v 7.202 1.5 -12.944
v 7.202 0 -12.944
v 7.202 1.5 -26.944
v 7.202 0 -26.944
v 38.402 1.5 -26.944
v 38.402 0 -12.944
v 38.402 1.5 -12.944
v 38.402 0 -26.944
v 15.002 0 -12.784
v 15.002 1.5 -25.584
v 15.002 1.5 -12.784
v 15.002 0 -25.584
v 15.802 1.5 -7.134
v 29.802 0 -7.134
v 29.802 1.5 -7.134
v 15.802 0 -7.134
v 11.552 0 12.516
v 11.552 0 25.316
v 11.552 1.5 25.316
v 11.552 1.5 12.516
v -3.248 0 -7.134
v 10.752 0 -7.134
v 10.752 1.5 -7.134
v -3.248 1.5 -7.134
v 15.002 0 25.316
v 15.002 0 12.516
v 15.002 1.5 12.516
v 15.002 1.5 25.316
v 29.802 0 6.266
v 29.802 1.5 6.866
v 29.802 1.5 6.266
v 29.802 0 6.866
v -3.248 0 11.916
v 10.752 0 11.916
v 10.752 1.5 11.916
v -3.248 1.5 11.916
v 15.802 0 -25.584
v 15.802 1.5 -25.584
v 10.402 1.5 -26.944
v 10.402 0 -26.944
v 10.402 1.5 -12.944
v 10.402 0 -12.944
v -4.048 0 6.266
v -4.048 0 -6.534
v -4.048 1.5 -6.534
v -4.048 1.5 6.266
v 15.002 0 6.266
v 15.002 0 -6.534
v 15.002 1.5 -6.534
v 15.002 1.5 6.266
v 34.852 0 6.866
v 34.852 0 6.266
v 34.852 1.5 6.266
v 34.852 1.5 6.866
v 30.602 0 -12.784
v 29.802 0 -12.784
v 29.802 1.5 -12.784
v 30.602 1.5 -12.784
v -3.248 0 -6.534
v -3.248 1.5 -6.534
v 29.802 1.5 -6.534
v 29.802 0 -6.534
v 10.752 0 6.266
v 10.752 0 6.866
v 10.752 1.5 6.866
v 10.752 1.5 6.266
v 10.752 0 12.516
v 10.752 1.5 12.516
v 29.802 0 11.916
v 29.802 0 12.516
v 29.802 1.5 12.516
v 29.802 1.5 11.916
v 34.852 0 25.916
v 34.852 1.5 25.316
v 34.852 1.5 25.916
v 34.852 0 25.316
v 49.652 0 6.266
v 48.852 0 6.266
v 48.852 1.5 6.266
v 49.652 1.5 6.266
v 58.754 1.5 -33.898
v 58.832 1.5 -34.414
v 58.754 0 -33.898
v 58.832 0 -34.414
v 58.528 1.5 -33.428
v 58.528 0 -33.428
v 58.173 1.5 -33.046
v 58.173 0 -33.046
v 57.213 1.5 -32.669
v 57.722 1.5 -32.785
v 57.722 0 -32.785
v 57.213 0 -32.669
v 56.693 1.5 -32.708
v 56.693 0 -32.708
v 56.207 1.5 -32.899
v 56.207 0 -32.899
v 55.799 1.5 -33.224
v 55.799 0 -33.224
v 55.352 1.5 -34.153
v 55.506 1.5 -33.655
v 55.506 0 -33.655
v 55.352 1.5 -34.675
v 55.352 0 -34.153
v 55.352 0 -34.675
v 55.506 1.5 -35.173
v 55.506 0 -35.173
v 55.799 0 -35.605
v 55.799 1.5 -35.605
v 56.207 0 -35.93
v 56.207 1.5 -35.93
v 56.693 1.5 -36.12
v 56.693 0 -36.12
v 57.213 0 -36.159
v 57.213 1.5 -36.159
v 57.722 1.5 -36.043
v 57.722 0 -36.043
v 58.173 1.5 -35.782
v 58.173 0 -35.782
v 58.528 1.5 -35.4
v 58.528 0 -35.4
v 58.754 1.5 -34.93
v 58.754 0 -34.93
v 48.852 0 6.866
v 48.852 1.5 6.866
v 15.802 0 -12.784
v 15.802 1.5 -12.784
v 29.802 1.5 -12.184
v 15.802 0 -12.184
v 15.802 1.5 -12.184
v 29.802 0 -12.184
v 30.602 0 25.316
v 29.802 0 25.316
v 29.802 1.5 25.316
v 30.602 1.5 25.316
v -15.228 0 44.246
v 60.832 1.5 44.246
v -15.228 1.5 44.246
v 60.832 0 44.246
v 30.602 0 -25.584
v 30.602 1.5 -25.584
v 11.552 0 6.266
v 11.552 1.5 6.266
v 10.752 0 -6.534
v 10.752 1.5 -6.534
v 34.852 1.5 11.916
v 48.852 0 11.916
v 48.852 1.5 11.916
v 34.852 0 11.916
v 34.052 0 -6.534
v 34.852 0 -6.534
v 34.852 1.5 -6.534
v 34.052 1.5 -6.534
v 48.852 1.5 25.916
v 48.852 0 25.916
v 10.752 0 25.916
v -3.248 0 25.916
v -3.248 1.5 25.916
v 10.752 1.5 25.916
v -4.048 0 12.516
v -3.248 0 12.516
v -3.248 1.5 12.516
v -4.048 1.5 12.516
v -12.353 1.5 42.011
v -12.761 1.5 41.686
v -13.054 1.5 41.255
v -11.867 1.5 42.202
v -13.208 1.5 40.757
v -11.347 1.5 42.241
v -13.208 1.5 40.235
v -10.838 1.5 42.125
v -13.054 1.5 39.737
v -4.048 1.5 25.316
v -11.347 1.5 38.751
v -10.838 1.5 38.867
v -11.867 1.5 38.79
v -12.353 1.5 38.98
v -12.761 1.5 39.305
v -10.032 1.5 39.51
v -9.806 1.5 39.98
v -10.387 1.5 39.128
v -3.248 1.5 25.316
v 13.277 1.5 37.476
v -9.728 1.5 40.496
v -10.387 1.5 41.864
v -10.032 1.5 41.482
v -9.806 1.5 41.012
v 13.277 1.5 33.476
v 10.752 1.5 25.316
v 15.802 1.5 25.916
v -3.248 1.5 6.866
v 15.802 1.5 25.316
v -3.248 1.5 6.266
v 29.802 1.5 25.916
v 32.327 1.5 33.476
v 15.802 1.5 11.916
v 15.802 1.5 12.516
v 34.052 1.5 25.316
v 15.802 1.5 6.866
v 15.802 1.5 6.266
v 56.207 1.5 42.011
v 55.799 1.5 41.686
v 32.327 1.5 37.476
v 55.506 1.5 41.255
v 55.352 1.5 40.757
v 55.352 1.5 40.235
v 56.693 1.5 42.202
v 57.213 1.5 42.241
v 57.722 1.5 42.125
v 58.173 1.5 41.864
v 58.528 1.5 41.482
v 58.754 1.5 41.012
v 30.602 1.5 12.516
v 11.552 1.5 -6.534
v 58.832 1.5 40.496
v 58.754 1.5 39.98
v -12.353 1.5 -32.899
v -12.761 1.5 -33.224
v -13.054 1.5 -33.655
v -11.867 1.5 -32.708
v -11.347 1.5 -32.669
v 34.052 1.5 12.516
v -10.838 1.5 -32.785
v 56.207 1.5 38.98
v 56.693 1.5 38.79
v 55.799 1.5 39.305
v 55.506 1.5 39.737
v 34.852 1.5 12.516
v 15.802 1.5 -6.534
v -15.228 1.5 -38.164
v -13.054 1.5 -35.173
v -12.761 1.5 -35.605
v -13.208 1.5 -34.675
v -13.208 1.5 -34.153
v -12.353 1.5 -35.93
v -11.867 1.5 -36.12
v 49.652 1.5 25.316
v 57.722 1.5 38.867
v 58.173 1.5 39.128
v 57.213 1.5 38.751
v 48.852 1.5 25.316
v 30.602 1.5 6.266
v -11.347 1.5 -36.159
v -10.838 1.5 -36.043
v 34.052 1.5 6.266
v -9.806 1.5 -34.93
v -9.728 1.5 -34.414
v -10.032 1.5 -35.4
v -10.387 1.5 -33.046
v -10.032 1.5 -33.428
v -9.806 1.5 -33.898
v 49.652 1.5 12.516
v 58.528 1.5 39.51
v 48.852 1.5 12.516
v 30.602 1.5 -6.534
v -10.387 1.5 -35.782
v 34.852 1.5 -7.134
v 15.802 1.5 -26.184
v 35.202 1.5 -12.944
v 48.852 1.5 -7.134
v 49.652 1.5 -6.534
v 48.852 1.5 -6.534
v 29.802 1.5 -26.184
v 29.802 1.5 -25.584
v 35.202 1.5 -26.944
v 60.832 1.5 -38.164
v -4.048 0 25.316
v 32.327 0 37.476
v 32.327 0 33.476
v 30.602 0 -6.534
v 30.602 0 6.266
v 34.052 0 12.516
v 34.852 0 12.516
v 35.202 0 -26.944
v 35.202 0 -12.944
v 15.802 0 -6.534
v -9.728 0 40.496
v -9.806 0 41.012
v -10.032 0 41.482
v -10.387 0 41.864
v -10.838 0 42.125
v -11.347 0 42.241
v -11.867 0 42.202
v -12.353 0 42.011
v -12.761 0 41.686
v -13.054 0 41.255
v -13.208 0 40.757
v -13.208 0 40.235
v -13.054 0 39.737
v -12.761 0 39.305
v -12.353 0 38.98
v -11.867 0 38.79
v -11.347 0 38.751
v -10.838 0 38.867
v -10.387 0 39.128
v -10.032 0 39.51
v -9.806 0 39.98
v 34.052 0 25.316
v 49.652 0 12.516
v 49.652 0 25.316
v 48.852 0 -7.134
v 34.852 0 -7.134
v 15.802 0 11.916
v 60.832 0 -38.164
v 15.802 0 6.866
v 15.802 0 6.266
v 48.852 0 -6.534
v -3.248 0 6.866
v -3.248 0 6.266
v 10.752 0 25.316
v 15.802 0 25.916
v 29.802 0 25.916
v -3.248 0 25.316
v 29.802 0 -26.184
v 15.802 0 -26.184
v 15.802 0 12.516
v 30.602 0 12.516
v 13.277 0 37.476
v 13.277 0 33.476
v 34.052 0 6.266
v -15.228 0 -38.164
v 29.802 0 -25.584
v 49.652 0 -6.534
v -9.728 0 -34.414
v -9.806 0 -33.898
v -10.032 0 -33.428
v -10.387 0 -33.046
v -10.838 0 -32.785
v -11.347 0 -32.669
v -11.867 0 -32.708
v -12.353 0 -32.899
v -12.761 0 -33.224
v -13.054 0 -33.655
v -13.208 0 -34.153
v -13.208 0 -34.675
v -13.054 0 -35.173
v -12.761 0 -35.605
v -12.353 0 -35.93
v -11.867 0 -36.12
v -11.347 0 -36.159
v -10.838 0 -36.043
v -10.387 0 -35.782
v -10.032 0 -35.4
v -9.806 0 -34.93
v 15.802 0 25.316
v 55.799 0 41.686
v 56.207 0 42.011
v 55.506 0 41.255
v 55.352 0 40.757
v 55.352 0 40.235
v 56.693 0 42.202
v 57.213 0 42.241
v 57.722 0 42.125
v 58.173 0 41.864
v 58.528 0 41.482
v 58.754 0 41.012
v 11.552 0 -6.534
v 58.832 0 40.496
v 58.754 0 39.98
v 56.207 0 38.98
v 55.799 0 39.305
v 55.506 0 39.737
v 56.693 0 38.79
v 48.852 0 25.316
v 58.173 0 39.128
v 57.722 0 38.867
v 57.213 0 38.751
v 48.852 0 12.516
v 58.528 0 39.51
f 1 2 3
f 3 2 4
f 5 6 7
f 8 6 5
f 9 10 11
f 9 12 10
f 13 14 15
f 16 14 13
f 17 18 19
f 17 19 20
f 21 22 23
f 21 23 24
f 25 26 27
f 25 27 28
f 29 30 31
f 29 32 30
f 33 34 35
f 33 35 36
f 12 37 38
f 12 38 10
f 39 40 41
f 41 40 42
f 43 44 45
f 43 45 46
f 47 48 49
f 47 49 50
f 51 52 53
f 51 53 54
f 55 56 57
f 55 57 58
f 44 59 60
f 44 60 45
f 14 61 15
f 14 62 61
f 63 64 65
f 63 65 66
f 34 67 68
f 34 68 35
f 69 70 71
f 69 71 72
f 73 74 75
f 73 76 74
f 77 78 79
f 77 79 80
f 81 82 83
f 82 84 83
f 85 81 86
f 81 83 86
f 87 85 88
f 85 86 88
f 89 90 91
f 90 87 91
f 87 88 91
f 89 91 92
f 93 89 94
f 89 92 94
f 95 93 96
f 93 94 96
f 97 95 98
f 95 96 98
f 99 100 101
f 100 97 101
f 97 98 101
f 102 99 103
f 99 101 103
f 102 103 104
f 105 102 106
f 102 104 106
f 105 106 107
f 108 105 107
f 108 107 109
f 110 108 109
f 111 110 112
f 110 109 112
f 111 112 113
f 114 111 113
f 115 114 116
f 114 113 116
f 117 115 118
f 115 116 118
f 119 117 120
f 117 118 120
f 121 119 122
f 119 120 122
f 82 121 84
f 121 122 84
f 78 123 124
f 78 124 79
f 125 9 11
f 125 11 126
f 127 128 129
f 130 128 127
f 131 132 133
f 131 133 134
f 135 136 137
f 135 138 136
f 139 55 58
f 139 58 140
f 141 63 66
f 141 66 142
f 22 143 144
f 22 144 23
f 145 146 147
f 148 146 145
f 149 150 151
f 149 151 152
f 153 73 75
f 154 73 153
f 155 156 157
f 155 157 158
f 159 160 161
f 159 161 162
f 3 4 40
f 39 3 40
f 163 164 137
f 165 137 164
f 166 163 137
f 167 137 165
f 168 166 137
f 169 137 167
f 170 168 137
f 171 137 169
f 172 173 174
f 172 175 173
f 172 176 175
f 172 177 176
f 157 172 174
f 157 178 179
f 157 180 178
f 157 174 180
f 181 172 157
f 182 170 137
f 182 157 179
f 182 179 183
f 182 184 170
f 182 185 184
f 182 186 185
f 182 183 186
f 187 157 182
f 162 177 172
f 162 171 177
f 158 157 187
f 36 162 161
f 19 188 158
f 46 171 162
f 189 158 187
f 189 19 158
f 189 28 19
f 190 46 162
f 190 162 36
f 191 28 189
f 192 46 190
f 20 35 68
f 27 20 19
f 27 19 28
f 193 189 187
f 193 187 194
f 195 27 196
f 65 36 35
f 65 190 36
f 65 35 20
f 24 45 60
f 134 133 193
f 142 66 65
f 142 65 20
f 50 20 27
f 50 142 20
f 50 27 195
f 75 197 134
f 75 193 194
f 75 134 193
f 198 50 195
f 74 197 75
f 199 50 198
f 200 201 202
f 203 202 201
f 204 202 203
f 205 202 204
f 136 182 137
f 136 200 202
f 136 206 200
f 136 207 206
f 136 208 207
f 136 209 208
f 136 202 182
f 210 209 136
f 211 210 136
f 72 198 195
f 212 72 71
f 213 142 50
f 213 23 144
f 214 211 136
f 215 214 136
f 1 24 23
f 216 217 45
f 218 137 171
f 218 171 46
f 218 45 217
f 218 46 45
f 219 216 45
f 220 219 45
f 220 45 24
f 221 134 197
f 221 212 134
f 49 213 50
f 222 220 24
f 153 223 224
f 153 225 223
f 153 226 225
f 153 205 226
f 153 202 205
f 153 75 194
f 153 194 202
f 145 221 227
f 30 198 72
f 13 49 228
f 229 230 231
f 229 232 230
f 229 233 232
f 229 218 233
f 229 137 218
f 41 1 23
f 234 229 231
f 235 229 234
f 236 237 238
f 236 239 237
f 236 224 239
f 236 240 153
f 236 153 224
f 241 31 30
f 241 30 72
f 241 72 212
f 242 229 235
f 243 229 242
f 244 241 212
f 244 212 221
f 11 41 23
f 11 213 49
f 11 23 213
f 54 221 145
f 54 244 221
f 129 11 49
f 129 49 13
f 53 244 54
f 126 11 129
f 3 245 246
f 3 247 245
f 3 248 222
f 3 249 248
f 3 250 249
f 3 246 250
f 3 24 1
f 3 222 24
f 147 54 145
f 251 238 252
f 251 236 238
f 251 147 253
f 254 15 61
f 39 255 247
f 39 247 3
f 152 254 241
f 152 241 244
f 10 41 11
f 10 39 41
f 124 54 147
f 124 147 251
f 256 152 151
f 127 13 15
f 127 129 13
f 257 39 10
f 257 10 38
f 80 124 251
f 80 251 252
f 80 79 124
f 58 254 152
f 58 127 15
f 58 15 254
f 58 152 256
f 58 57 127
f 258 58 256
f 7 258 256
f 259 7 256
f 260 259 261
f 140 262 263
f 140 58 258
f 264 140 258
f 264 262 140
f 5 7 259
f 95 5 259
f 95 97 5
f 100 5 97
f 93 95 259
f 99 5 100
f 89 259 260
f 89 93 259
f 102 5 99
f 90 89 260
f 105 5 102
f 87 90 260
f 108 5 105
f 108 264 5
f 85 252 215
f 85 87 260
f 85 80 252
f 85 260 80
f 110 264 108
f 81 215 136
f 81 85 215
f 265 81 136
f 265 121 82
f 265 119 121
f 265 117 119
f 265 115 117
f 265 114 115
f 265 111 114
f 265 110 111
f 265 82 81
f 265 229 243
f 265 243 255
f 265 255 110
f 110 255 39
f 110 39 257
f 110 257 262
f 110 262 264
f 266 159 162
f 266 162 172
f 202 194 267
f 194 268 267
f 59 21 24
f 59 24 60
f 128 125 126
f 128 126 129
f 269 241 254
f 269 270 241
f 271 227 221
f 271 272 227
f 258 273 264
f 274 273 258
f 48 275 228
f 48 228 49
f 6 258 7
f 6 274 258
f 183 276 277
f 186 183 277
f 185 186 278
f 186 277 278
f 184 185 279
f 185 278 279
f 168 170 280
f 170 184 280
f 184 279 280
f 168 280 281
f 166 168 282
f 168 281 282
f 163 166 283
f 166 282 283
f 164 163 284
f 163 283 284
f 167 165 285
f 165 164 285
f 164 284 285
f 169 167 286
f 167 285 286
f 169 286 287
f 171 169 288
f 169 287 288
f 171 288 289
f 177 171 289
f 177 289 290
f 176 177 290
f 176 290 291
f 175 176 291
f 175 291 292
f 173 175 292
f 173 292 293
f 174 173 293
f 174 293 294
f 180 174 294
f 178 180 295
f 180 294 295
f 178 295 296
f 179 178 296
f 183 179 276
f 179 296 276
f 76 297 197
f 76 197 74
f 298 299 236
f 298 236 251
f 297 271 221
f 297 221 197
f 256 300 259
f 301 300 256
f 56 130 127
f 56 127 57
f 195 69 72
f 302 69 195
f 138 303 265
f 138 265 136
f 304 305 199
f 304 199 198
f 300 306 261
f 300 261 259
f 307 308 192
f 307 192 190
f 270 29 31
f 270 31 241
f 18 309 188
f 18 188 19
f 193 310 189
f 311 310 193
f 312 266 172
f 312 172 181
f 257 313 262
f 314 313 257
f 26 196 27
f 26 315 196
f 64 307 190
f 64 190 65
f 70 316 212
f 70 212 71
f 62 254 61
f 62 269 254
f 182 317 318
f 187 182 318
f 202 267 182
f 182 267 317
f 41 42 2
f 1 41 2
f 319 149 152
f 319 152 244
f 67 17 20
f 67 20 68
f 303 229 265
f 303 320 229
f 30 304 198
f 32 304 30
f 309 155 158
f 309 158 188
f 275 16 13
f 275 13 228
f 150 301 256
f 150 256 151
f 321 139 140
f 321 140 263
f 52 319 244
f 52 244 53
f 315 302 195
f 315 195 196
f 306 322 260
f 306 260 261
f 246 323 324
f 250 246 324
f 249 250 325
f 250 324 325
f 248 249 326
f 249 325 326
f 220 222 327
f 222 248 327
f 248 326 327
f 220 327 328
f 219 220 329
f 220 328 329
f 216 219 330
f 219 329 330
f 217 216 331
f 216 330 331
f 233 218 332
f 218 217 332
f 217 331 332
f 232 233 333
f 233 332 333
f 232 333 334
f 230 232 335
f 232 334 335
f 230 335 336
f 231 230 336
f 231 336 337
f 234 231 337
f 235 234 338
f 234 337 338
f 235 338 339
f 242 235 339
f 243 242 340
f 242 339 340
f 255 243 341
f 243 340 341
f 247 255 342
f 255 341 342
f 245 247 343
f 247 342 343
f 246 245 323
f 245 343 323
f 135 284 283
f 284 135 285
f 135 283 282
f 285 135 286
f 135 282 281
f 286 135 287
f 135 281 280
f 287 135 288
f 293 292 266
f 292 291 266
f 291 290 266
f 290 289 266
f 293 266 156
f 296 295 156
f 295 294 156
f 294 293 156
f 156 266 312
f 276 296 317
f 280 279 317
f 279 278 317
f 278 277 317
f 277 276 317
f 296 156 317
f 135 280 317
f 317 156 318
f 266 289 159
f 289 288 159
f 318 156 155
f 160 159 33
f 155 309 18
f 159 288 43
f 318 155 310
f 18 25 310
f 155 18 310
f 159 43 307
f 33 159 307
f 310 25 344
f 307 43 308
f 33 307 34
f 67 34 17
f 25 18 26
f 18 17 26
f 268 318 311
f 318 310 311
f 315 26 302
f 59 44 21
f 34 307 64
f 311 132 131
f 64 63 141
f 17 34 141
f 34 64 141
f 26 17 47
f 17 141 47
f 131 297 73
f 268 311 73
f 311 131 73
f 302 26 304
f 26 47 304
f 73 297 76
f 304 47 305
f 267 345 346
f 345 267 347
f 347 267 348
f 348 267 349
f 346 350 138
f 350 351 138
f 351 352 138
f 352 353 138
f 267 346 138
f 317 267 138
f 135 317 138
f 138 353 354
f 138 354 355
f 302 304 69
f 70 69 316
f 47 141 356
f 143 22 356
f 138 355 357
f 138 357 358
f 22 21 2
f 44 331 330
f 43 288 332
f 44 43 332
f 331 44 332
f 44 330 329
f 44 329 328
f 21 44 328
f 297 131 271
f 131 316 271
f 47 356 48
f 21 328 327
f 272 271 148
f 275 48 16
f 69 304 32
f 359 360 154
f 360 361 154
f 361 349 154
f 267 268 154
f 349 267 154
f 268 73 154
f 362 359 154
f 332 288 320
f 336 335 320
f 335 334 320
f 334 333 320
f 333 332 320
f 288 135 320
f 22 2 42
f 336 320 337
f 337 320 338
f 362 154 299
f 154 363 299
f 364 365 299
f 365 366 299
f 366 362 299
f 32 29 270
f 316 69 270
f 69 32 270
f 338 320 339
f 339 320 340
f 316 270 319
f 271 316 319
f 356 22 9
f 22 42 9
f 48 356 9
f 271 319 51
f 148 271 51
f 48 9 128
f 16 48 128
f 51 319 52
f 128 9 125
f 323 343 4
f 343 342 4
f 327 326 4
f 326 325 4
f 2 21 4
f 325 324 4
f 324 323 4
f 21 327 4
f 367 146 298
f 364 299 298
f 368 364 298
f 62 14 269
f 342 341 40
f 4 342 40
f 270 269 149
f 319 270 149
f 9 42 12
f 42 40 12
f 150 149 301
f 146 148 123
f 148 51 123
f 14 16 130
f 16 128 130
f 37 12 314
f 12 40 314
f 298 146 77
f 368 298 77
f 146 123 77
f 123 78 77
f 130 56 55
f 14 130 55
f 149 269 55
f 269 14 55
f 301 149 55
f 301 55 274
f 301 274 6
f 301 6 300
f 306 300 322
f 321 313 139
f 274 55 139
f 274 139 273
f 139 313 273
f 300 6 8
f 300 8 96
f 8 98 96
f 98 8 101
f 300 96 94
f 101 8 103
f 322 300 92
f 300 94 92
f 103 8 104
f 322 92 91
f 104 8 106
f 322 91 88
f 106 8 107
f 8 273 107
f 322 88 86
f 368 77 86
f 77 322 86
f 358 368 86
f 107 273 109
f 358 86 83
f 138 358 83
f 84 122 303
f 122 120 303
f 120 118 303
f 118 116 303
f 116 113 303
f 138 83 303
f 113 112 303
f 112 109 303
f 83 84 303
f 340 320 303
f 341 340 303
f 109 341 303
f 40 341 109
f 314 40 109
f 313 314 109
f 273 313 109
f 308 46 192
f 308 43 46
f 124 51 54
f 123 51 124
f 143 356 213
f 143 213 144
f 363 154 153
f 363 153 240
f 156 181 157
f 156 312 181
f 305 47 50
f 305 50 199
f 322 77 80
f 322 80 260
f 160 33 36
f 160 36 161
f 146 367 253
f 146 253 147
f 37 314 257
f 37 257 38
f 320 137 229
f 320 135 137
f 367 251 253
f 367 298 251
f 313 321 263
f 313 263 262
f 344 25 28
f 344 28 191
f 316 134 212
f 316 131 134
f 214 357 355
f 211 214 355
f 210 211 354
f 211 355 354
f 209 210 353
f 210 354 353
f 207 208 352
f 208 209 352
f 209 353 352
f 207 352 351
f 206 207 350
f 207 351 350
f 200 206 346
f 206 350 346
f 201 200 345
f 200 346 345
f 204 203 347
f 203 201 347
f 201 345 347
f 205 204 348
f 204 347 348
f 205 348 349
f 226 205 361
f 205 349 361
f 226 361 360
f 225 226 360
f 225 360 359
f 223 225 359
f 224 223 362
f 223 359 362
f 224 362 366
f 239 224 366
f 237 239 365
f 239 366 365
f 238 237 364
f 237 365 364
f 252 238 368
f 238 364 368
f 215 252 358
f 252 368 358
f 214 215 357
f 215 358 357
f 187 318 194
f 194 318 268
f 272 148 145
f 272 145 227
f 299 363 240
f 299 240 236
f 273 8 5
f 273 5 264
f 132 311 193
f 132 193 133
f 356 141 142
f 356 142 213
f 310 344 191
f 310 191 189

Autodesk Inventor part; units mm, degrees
ref_plane "YZ Plane" through (0, 0, 0) normal (1, 0, 0) x (0, 1, 0)
ref_plane "XZ Plane" through (0, 0, 0) normal (0, 1, 0) x (-1, 0, 0)
ref_plane "XY Plane" through (0, 0, 0) normal (0, 0, 1) x (1, 0, 0)
sketch "1u" plane through (0, 0, 0) normal (0, 1, 0) x (-1, 0, 0)
  line L0 (7, 7) -> (-7, 7)
  line L1 (-7, 7) -> (-7, 6.4)
  line L2 (-7, 6.4) -> (-7.8, 6.4)
  line L3 (-7.8, 6.4) -> (-7.8, -6.4)
  line L4 (-7.8, -6.4) -> (-7, -6.4)
  line L5 (-7, -6.4) -> (-7, -7)
  line L6 (-7, -7) -> (7, -7)
  line L7 (7, -7) -> (7, -6.4)
  line L8 (7, -6.4) -> (7.8, -6.4)
  line L9 (7.8, -6.4) -> (7.8, 6.4)
  line L10 (7.8, 6.4) -> (7, 6.4)
  line L11 (7, 6.4) -> (7, 7)
  line L12 (9.525, -9.525) -> (9.525, 9.525) construction
  line L13 (9.525, 9.525) -> (-9.525, 9.525) construction
  line L14 (-9.525, 9.525) -> (-9.525, -9.525) construction
  line L15 (-9.525, -9.525) -> (9.525, -9.525) construction
  line L16 (9.525, 0) -> (7.8, 0) construction
  line L17 (-7.8, 0) -> (-9.525, 0) construction
  line L18 (0, 7) -> (0, 9.525) construction
  line L19 (0, -7) -> (0, -9.525) construction
  dimension "d0" = 12.8
  dimension "d1" = 14
  dimension "d2" = 14
  dimension "d3" = 15.6
  dimension "d4" = 19.05
  dimension "d5" = 19.05
sketch "1.25u" plane through (0, 0, 0) normal (0, 1, 0) x (-1, 0, 0)
  line L0 (7, 7) -> (-7, 7)
  line L1 (-7, 7) -> (-7, 6.4)
  line L2 (-7, 6.4) -> (-7.8, 6.4)
  line L3 (-7.8, 6.4) -> (-7.8, -6.4)
  line L4 (-7.8, -6.4) -> (-7, -6.4)
  line L5 (-7, -6.4) -> (-7, -7)
  line L6 (-7, -7) -> (7, -7)
  line L7 (7, -7) -> (7, -6.4)
  line L8 (7, -6.4) -> (7.8, -6.4)
  line L9 (7.8, -6.4) -> (7.8, 6.4)
  line L10 (7.8, 6.4) -> (7, 6.4)
  line L11 (7, 6.4) -> (7, 7)
  line L12 (11.9063, -9.525) -> (11.9063, 9.525) construction
  line L13 (11.9063, 9.525) -> (-11.9062, 9.525) construction
  line L14 (-11.9062, 9.525) -> (-11.9062, -9.525) construction
  line L15 (-11.9062, -9.525) -> (11.9063, -9.525) construction
  line L16 (11.9062, 0) -> (7.8, 0) construction
  line L17 (-7.8, 0) -> (-11.9062, 0) construction
  line L18 (0, 7) -> (0, 9.525) construction
  line L19 (0, -7) -> (0, -9.525) construction
  dimension "d45" = 12.8
  dimension "d46" = 14
  dimension "d47" = 14
  dimension "d48" = 15.6
  dimension "d49" = 23.8125
  dimension "d50" = 19.05
sketch "1.5u" plane through (0, 0, 0) normal (0, 1, 0) x (-1, 0, 0)
  line L0 (7, 7) -> (-7, 7)
  line L1 (-7, 7) -> (-7, 6.4)
  line L2 (-7, 6.4) -> (-7.8, 6.4)
  line L3 (-7.8, 6.4) -> (-7.8, -6.4)
  line L4 (-7.8, -6.4) -> (-7, -6.4)
  line L5 (-7, -6.4) -> (-7, -7)
  line L6 (-7, -7) -> (7, -7)
  line L7 (7, -7) -> (7, -6.4)
  line L8 (7, -6.4) -> (7.8, -6.4)
  line L9 (7.8, -6.4) -> (7.8, 6.4)
  line L10 (7.8, 6.4) -> (7, 6.4)
  line L11 (7, 6.4) -> (7, 7)
  line L12 (14.2875, -9.525) -> (14.2875, 9.525) construction
  line L13 (14.2875, 9.525) -> (-14.2875, 9.525) construction
  line L14 (-14.2875, 9.525) -> (-14.2875, -9.525) construction
  line L15 (-14.2875, -9.525) -> (14.2875, -9.525) construction
  line L16 (14.2875, 0) -> (7.8, 0) construction
  line L17 (-7.8, 0) -> (-14.2875, 0) construction
  line L18 (0, 7) -> (0, 9.525) construction
  line L19 (0, -7) -> (0, -9.525) construction
  dimension "d39" = 12.8
  dimension "d40" = 14
  dimension "d41" = 14
  dimension "d42" = 15.6
  dimension "d43" = 28.575
  dimension "d44" = 19.05
sketch "2u" plane through (0, 0, 0) normal (0, 1, 0) x (-1, 0, 0)
  line L0 (7, -7) -> (7, -6.4)
  line L1 (7, -6.4) -> (7.8, -6.4)
  line L2 (19.05, 0) -> (7.8, 0) construction
  line L3 (19.05, -9.525) -> (19.05, 9.525) construction
  line L4 (7.8, -6.4) -> (7.8, 6.4)
  line L5 (0, -7) -> (0, -9.525) construction
  line L6 (-7, -6.4) -> (-7, -7)
  line L7 (-7.8, 0) -> (-19.05, 0) construction
  line L8 (-7.8, -6.4) -> (-7, -6.4)
  line L9 (0, 7) -> (0, 9.525) construction
  line L10 (7, 7) -> (-7, 7)
  line L11 (-7, -7) -> (7, -7)
  line L12 (-19.05, -9.525) -> (19.05, -9.525) construction
  line L13 (19.05, 9.525) -> (-19.05, 9.525) construction
  line L14 (-19.05, 9.525) -> (-19.05, -9.525) construction
  line L15 (-7, 7) -> (-7, 6.4)
  line L16 (-7, 6.4) -> (-7.8, 6.4)
  line L17 (-7.8, 6.4) -> (-7.8, -6.4)
  line L18 (7, 6.4) -> (7, 7)
  line L19 (7.8, 6.4) -> (7, 6.4)
  line L20 (15.6, -6.24) -> (15.6, 7.76)
  line L21 (15.6, 7.76) -> (12.4, 7.76)
  line L22 (12.4, 7.76) -> (12.4, -6.24)
  line L23 (12.4, -6.24) -> (15.6, -6.24)
  line L24 (14, -6.24) -> (14, 7.76) construction
  line L25 (15.6, 0.76) -> (12.4, 0.76) construction
  line L26 (-12.4, 7.76) -> (-12.4, -6.24)
  line L27 (-12.4, -6.24) -> (-15.6, -6.24)
  line L28 (-15.6, -6.24) -> (-15.6, 7.76)
  line L29 (-15.6, 7.76) -> (-12.4, 7.76)
  line L30 (-14, -6.24) -> (-14, 7.76) construction
  line L31 (-15.6, 0.76) -> (-12.4, 0.76) construction
  dimension "d28" = 12.8
  dimension "d29" = 14
  dimension "d30" = 14
  dimension "d31" = 15.6
  dimension "d32" = 38.1
  dimension "d33" = 19.05
  dimension "d34" = 3.2
  dimension "d35" = 14
  dimension "d36" = 14
  dimension "d37" = 0.76
sketch "Sketch11" plane through (0, 0, 0) normal (0, 1, 0) x (1, 0, 0)
  line L0 (10.7522, 7.1342) -> (-3.2478, 7.1342)
  line L1 (-3.2478, 7.1342) -> (-3.2478, 6.5342)
  line L2 (-3.2478, 6.5342) -> (-4.0478, 6.5342)
  line L3 (-4.0478, 6.5342) -> (-4.0478, -6.2658)
  line L4 (-4.0478, -6.2658) -> (-3.2478, -6.2658)
  line L5 (-3.2478, -6.2658) -> (-3.2478, -6.8658)
  line L6 (-3.2478, -6.8658) -> (10.7522, -6.8658)
  line L7 (10.7522, -6.8658) -> (10.7522, -6.2658)
  line L8 (10.7522, -6.2658) -> (11.5522, -6.2658)
  line L9 (11.5522, -6.2658) -> (11.5522, 6.5342)
  line L10 (11.5522, 6.5342) -> (10.7522, 6.5342)
  line L11 (10.7522, 6.5342) -> (10.7522, 7.1342)
  line L12 (13.2772, -9.3908) -> (13.2772, 9.6592) construction
  line L13 (13.2772, 9.6592) -> (-5.7728, 9.6592) construction
  line L14 (-5.7728, 9.6592) -> (-5.7728, -9.3908) construction
  line L15 (-5.7728, -9.3908) -> (13.2772, -9.3908) construction
  line L16 (13.2772, 0.1342) -> (11.5522, 0.1342) construction
  line L17 (-4.0478, 0.1342) -> (-5.7728, 0.1342) construction
  line L18 (3.7522, 7.1342) -> (3.7522, 9.6592) construction
  line L19 (3.7522, -6.8658) -> (3.7522, -9.3908) construction
  line L20 (29.8022, 7.1342) -> (15.8022, 7.1342)
  line L21 (15.8022, 7.1342) -> (15.8022, 6.5342)
  line L22 (15.8022, 6.5342) -> (15.0022, 6.5342)
  line L23 (15.0022, 6.5342) -> (15.0022, -6.2658)
  line L24 (15.0022, -6.2658) -> (15.8022, -6.2658)
  line L25 (15.8022, -6.2658) -> (15.8022, -6.8658)
  line L26 (15.8022, -6.8658) -> (29.8022, -6.8658)
  line L27 (29.8022, -6.8658) -> (29.8022, -6.2658)
  line L28 (29.8022, -6.2658) -> (30.6022, -6.2658)
  line L29 (30.6022, -6.2658) -> (30.6022, 6.5342)
  line L30 (30.6022, 6.5342) -> (29.8022, 6.5342)
  line L31 (29.8022, 6.5342) -> (29.8022, 7.1342)
  line L32 (32.3272, -9.3908) -> (32.3272, 9.6592) construction
  line L33 (32.3272, 9.6592) -> (13.2772, 9.6592) construction
  line L34 (13.2772, 9.6592) -> (13.2772, -9.3908) construction
  line L35 (13.2772, -9.3908) -> (32.3272, -9.3908) construction
  line L36 (32.3272, 0.1342) -> (30.6022, 0.1342) construction
  line L37 (15.0022, 0.1342) -> (13.2772, 0.1342) construction
  line L38 (22.8022, 7.1342) -> (22.8022, 9.6592) construction
  line L39 (22.8022, -6.8658) -> (22.8022, -9.3908) construction
  line L40 (48.8522, 7.1342) -> (34.8522, 7.1342)
  line L41 (34.8522, 7.1342) -> (34.8522, 6.5342)
  line L42 (34.8522, 6.5342) -> (34.0522, 6.5342)
  line L43 (34.0522, 6.5342) -> (34.0522, -6.2658)
  line L44 (34.0522, -6.2658) -> (34.8522, -6.2658)
  line L45 (34.8522, -6.2658) -> (34.8522, -6.8658)
  line L46 (34.8522, -6.8658) -> (48.8522, -6.8658)
  line L47 (48.8522, -6.8658) -> (48.8522, -6.2658)
  line L48 (48.8522, -6.2658) -> (49.6522, -6.2658)
  line L49 (49.6522, -6.2658) -> (49.6522, 6.5342)
  line L50 (49.6522, 6.5342) -> (48.8522, 6.5342)
  line L51 (48.8522, 6.5342) -> (48.8522, 7.1342)
  line L52 (51.3772, -9.3908) -> (51.3772, 9.6592) construction
  line L53 (51.3772, 9.6592) -> (32.3272, 9.6592) construction
  line L54 (32.3272, 9.6592) -> (32.3272, -9.3908) construction
  line L55 (32.3272, -9.3908) -> (51.3772, -9.3908) construction
  line L56 (51.3772, 0.1342) -> (49.6522, 0.1342) construction
  line L57 (34.0522, 0.1342) -> (32.3272, 0.1342) construction
  line L58 (41.8522, 7.1342) -> (41.8522, 9.6592) construction
  line L59 (41.8522, -6.8658) -> (41.8522, -9.3908) construction
  line L60 (10.7522, -11.9158) -> (-3.2478, -11.9158)
  line L61 (-3.2478, -11.9158) -> (-3.2478, -12.5158)
  line L62 (-3.2478, -12.5158) -> (-4.0478, -12.5158)
  line L63 (-4.0478, -12.5158) -> (-4.0478, -25.3158)
  line L64 (-4.0478, -25.3158) -> (-3.2478, -25.3158)
  line L65 (-3.2478, -25.3158) -> (-3.2478, -25.9158)
  line L66 (-3.2478, -25.9158) -> (10.7522, -25.9158)
  line L67 (10.7522, -25.9158) -> (10.7522, -25.3158)
  line L68 (10.7522, -25.3158) -> (11.5522, -25.3158)
  line L69 (11.5522, -25.3158) -> (11.5522, -12.5158)
  line L70 (11.5522, -12.5158) -> (10.7522, -12.5158)
  line L71 (10.7522, -12.5158) -> (10.7522, -11.9158)
  line L72 (13.2772, -28.4408) -> (13.2772, -9.3908) construction
  line L73 (13.2772, -9.3908) -> (-5.7728, -9.3908) construction
  line L74 (-5.7728, -9.3908) -> (-5.7728, -28.4408) construction
  line L75 (-5.7728, -28.4408) -> (13.2772, -28.4408) construction
  line L76 (13.2772, -18.9158) -> (11.5522, -18.9158) construction
  line L77 (-4.0478, -18.9158) -> (-5.7728, -18.9158) construction
  line L78 (3.7522, -11.9158) -> (3.7522, -9.3908) construction
  line L79 (3.7522, -25.9158) -> (3.7522, -28.4408) construction
  line L80 (29.8022, -11.9158) -> (15.8022, -11.9158)
  line L81 (15.8022, -11.9158) -> (15.8022, -12.5158)
  line L82 (15.8022, -12.5158) -> (15.0022, -12.5158)
  line L83 (15.0022, -12.5158) -> (15.0022, -25.3158)
  line L84 (15.0022, -25.3158) -> (15.8022, -25.3158)
  line L85 (15.8022, -25.3158) -> (15.8022, -25.9158)
  line L86 (15.8022, -25.9158) -> (29.8022, -25.9158)
  line L87 (29.8022, -25.9158) -> (29.8022, -25.3158)
  line L88 (29.8022, -25.3158) -> (30.6022, -25.3158)
  line L89 (30.6022, -25.3158) -> (30.6022, -12.5158)
  line L90 (30.6022, -12.5158) -> (29.8022, -12.5158)
  line L91 (29.8022, -12.5158) -> (29.8022, -11.9158)
  line L92 (32.3272, -28.4408) -> (32.3272, -9.3908) construction
  line L93 (32.3272, -9.3908) -> (13.2772, -9.3908) construction
  line L94 (13.2772, -9.3908) -> (13.2772, -28.4408) construction
  line L95 (13.2772, -28.4408) -> (32.3272, -28.4408) construction
  line L96 (32.3272, -18.9158) -> (30.6022, -18.9158) construction
  line L97 (15.0022, -18.9158) -> (13.2772, -18.9158) construction
  line L98 (22.8022, -11.9158) -> (22.8022, -9.3908) construction
  line L99 (22.8022, -25.9158) -> (22.8022, -28.4408) construction
  line L100 (48.8522, -11.9158) -> (34.8522, -11.9158)
  line L101 (34.8522, -11.9158) -> (34.8522, -12.5158)
  line L102 (34.8522, -12.5158) -> (34.0522, -12.5158)
  line L103 (34.0522, -12.5158) -> (34.0522, -25.3158)
  line L104 (34.0522, -25.3158) -> (34.8522, -25.3158)
  line L105 (34.8522, -25.3158) -> (34.8522, -25.9158)
  line L106 (34.8522, -25.9158) -> (48.8522, -25.9158)
  line L107 (48.8522, -25.9158) -> (48.8522, -25.3158)
  line L108 (48.8522, -25.3158) -> (49.6522, -25.3158)
  line L109 (49.6522, -25.3158) -> (49.6522, -12.5158)
  line L110 (49.6522, -12.5158) -> (48.8522, -12.5158)
  line L111 (48.8522, -12.5158) -> (48.8522, -11.9158)
  line L112 (51.3772, -28.4408) -> (51.3772, -9.3908) construction
  line L113 (51.3772, -9.3908) -> (32.3272, -9.3908) construction
  line L114 (32.3272, -9.3908) -> (32.3272, -28.4408) construction
  line L115 (32.3272, -28.4408) -> (51.3772, -28.4408) construction
  line L116 (51.3772, -18.9158) -> (49.6522, -18.9158) construction
  line L117 (34.0522, -18.9158) -> (32.3272, -18.9158) construction
  line L118 (41.8522, -11.9158) -> (41.8522, -9.3908) construction
  line L119 (41.8522, -25.9158) -> (41.8522, -28.4408) construction
  line L120 (41.8522, 19.1842) -> (30.6022, 19.1842) construction
  line L121 (30.6022, 12.7842) -> (30.6022, 25.5842)
  line L122 (41.8522, 9.6592) -> (41.8522, 28.7092) construction
  line L123 (29.8022, 12.7842) -> (30.6022, 12.7842)
  line L124 (29.8022, 12.1842) -> (29.8022, 12.7842)
  line L125 (3.7522, 9.6592) -> (41.8522, 9.6592) construction
  line L126 (41.8522, 28.7092) -> (3.7522, 28.7092) construction
  line L127 (22.8022, 26.1842) -> (22.8022, 28.7092) construction
  line L128 (22.8022, 12.1842) -> (22.8022, 9.6592) construction
  line L129 (15.8022, 12.1842) -> (29.8022, 12.1842)
  line L130 (29.8022, 26.1842) -> (15.8022, 26.1842)
  line L131 (15.8022, 12.7842) -> (15.8022, 12.1842)
  line L132 (15.0022, 12.7842) -> (15.8022, 12.7842)
  line L133 (15.0022, 25.5842) -> (15.0022, 12.7842)
  line L134 (15.8022, 26.1842) -> (15.8022, 25.5842)
  line L135 (15.8022, 25.5842) -> (15.0022, 25.5842)
  line L136 (7.2022, 26.9442) -> (10.4022, 26.9442)
  line L137 (29.8022, 25.5842) -> (29.8022, 26.1842)
  line L138 (30.6022, 25.5842) -> (29.8022, 25.5842)
  line L139 (38.4022, 26.9442) -> (35.2022, 26.9442)
  line L140 (35.2022, 26.9442) -> (35.2022, 12.9442)
  line L141 (36.8022, 12.9442) -> (36.8022, 26.9442) construction
  line L142 (38.4022, 12.9442) -> (38.4022, 26.9442)
  line L143 (38.4022, 19.9442) -> (35.2022, 19.9442) construction
  line L144 (35.2022, 12.9442) -> (38.4022, 12.9442)
  line L145 (7.2022, 19.9442) -> (10.4022, 19.9442) construction
  line L146 (10.4022, 26.9442) -> (10.4022, 12.9442)
  line L147 (15.0022, 19.1842) -> (3.7522, 19.1842) construction
  line L148 (8.8022, 12.9442) -> (8.8022, 26.9442) construction
  line L149 (7.2022, 12.9442) -> (7.2022, 26.9442)
  line L150 (3.7522, 28.7092) -> (3.7522, 9.6592) construction
  line L151 (10.4022, 12.9442) -> (7.2022, 12.9442)
  line L152 (-7.7278, 30.6642) -> (53.3322, 30.6642) construction
  line L153 (53.3322, 30.6642) -> (53.3322, -36.7458) construction
  line L154 (53.3322, -36.7458) -> (-7.7278, -36.7458) construction
  line L155 (-7.7278, -36.7458) -> (-7.7278, 30.6642) construction
  line L156 (-7.7278, -3.0408) -> (-5.7728, -3.0408) construction
  line L157 (53.3322, -3.0408) -> (51.3772, -3.0408) construction
  line L158 (22.8022, 30.6642) -> (22.8022, 28.7092) construction
  line L159 (-15.2278, 38.1642) -> (60.8322, 38.1642)
  line L160 (60.8322, 38.1642) -> (60.8322, -44.2458)
  line L161 (60.8322, -44.2458) -> (-15.2278, -44.2458)
  line L162 (-15.2278, -44.2458) -> (-15.2278, 38.1642)
  line L163 (22.8022, 38.1642) -> (22.8022, 30.6642) construction
  line L164 (60.8322, -3.0408) -> (53.3322, -3.0408) construction
  line L165 (-15.2278, -3.0408) -> (-7.7278, -3.0408) construction
  line L166 (22.8022, -44.2458) -> (22.8022, -36.7458) construction
  line L167 (13.2772, -33.4758) -> (32.3272, -33.4758)
  line L168 (32.3272, -33.4758) -> (32.3272, -37.4758)
  line L169 (32.3272, -37.4758) -> (13.2772, -37.4758)
  line L170 (13.2772, -37.4758) -> (13.2772, -33.4758)
  line L171 (13.2772, -35.4758) -> (32.3272, -35.4758) construction
  line L172 (-11.4778, 34.4142) -> (57.0822, 34.4142) construction
  line L173 (57.0822, 34.4142) -> (57.0822, -40.4958) construction
  line L174 (57.0822, -40.4958) -> (-11.4778, -40.4958) construction
  line L175 (-11.4778, -40.4958) -> (-11.4778, 34.4142) construction
  circle A0 centre (-11.4778, 34.4142) radius 1.75
  circle A1 centre (57.0822, 34.4142) radius 1.75
  circle A2 centre (57.0822, -40.4958) radius 1.75
  circle A3 centre (-11.4778, -40.4958) radius 1.75
  line L176 (-7.7278, 38.1642) -> (-7.7278, 34.4142) construction
  line L177 (-7.7278, 30.6642) -> (-7.7278, 34.4142) construction
  line L178 (-7.7278, 30.6642) -> (-11.4778, 30.6642) construction
  line L179 (-11.4778, 30.6642) -> (-15.2278, 30.6642) construction
  line L180 (53.3322, 30.6642) -> (57.0822, 30.6642) construction
  line L181 (57.0822, 30.6642) -> (60.8322, 30.6642) construction
  line L182 (53.3322, -36.7458) -> (53.3322, -40.4958) construction
  line L183 (53.3322, -40.4958) -> (53.3322, -44.2458) construction
  point P0 (0, 0)
  dimension "d298" = 12.8
  dimension "d299" = 14
  dimension "d300" = 14
  dimension "d301" = 15.6
  dimension "d302" = 19.05
  dimension "d303" = 19.05
  dimension "d306" = 19.05
  dimension "d309" = 19.05
  dimension "d312" = 12.8
  dimension "d313" = 14
  dimension "d314" = 14
  dimension "d315" = 15.6
  dimension "d316" = 38.1
  dimension "d317" = 19.05
  dimension "d318" = 3.2
  dimension "d319" = 14
  dimension "d320" = 14
  dimension "d321" = 0.76
  dimension "d323" = 61.06
  dimension "d324" = 67.41
  dimension "d325" = 7.5
  dimension "d326" = 1.27
  dimension "d327" = 4
  dimension "d328" = 3.5
  dimension "d329" = 3.5
  dimension "d330" = 3.5
  dimension "d331" = 3.5
extrude "Extrusion3" add sketch "Sketch11" along normal blind 1.5
properties part number "prototype"
